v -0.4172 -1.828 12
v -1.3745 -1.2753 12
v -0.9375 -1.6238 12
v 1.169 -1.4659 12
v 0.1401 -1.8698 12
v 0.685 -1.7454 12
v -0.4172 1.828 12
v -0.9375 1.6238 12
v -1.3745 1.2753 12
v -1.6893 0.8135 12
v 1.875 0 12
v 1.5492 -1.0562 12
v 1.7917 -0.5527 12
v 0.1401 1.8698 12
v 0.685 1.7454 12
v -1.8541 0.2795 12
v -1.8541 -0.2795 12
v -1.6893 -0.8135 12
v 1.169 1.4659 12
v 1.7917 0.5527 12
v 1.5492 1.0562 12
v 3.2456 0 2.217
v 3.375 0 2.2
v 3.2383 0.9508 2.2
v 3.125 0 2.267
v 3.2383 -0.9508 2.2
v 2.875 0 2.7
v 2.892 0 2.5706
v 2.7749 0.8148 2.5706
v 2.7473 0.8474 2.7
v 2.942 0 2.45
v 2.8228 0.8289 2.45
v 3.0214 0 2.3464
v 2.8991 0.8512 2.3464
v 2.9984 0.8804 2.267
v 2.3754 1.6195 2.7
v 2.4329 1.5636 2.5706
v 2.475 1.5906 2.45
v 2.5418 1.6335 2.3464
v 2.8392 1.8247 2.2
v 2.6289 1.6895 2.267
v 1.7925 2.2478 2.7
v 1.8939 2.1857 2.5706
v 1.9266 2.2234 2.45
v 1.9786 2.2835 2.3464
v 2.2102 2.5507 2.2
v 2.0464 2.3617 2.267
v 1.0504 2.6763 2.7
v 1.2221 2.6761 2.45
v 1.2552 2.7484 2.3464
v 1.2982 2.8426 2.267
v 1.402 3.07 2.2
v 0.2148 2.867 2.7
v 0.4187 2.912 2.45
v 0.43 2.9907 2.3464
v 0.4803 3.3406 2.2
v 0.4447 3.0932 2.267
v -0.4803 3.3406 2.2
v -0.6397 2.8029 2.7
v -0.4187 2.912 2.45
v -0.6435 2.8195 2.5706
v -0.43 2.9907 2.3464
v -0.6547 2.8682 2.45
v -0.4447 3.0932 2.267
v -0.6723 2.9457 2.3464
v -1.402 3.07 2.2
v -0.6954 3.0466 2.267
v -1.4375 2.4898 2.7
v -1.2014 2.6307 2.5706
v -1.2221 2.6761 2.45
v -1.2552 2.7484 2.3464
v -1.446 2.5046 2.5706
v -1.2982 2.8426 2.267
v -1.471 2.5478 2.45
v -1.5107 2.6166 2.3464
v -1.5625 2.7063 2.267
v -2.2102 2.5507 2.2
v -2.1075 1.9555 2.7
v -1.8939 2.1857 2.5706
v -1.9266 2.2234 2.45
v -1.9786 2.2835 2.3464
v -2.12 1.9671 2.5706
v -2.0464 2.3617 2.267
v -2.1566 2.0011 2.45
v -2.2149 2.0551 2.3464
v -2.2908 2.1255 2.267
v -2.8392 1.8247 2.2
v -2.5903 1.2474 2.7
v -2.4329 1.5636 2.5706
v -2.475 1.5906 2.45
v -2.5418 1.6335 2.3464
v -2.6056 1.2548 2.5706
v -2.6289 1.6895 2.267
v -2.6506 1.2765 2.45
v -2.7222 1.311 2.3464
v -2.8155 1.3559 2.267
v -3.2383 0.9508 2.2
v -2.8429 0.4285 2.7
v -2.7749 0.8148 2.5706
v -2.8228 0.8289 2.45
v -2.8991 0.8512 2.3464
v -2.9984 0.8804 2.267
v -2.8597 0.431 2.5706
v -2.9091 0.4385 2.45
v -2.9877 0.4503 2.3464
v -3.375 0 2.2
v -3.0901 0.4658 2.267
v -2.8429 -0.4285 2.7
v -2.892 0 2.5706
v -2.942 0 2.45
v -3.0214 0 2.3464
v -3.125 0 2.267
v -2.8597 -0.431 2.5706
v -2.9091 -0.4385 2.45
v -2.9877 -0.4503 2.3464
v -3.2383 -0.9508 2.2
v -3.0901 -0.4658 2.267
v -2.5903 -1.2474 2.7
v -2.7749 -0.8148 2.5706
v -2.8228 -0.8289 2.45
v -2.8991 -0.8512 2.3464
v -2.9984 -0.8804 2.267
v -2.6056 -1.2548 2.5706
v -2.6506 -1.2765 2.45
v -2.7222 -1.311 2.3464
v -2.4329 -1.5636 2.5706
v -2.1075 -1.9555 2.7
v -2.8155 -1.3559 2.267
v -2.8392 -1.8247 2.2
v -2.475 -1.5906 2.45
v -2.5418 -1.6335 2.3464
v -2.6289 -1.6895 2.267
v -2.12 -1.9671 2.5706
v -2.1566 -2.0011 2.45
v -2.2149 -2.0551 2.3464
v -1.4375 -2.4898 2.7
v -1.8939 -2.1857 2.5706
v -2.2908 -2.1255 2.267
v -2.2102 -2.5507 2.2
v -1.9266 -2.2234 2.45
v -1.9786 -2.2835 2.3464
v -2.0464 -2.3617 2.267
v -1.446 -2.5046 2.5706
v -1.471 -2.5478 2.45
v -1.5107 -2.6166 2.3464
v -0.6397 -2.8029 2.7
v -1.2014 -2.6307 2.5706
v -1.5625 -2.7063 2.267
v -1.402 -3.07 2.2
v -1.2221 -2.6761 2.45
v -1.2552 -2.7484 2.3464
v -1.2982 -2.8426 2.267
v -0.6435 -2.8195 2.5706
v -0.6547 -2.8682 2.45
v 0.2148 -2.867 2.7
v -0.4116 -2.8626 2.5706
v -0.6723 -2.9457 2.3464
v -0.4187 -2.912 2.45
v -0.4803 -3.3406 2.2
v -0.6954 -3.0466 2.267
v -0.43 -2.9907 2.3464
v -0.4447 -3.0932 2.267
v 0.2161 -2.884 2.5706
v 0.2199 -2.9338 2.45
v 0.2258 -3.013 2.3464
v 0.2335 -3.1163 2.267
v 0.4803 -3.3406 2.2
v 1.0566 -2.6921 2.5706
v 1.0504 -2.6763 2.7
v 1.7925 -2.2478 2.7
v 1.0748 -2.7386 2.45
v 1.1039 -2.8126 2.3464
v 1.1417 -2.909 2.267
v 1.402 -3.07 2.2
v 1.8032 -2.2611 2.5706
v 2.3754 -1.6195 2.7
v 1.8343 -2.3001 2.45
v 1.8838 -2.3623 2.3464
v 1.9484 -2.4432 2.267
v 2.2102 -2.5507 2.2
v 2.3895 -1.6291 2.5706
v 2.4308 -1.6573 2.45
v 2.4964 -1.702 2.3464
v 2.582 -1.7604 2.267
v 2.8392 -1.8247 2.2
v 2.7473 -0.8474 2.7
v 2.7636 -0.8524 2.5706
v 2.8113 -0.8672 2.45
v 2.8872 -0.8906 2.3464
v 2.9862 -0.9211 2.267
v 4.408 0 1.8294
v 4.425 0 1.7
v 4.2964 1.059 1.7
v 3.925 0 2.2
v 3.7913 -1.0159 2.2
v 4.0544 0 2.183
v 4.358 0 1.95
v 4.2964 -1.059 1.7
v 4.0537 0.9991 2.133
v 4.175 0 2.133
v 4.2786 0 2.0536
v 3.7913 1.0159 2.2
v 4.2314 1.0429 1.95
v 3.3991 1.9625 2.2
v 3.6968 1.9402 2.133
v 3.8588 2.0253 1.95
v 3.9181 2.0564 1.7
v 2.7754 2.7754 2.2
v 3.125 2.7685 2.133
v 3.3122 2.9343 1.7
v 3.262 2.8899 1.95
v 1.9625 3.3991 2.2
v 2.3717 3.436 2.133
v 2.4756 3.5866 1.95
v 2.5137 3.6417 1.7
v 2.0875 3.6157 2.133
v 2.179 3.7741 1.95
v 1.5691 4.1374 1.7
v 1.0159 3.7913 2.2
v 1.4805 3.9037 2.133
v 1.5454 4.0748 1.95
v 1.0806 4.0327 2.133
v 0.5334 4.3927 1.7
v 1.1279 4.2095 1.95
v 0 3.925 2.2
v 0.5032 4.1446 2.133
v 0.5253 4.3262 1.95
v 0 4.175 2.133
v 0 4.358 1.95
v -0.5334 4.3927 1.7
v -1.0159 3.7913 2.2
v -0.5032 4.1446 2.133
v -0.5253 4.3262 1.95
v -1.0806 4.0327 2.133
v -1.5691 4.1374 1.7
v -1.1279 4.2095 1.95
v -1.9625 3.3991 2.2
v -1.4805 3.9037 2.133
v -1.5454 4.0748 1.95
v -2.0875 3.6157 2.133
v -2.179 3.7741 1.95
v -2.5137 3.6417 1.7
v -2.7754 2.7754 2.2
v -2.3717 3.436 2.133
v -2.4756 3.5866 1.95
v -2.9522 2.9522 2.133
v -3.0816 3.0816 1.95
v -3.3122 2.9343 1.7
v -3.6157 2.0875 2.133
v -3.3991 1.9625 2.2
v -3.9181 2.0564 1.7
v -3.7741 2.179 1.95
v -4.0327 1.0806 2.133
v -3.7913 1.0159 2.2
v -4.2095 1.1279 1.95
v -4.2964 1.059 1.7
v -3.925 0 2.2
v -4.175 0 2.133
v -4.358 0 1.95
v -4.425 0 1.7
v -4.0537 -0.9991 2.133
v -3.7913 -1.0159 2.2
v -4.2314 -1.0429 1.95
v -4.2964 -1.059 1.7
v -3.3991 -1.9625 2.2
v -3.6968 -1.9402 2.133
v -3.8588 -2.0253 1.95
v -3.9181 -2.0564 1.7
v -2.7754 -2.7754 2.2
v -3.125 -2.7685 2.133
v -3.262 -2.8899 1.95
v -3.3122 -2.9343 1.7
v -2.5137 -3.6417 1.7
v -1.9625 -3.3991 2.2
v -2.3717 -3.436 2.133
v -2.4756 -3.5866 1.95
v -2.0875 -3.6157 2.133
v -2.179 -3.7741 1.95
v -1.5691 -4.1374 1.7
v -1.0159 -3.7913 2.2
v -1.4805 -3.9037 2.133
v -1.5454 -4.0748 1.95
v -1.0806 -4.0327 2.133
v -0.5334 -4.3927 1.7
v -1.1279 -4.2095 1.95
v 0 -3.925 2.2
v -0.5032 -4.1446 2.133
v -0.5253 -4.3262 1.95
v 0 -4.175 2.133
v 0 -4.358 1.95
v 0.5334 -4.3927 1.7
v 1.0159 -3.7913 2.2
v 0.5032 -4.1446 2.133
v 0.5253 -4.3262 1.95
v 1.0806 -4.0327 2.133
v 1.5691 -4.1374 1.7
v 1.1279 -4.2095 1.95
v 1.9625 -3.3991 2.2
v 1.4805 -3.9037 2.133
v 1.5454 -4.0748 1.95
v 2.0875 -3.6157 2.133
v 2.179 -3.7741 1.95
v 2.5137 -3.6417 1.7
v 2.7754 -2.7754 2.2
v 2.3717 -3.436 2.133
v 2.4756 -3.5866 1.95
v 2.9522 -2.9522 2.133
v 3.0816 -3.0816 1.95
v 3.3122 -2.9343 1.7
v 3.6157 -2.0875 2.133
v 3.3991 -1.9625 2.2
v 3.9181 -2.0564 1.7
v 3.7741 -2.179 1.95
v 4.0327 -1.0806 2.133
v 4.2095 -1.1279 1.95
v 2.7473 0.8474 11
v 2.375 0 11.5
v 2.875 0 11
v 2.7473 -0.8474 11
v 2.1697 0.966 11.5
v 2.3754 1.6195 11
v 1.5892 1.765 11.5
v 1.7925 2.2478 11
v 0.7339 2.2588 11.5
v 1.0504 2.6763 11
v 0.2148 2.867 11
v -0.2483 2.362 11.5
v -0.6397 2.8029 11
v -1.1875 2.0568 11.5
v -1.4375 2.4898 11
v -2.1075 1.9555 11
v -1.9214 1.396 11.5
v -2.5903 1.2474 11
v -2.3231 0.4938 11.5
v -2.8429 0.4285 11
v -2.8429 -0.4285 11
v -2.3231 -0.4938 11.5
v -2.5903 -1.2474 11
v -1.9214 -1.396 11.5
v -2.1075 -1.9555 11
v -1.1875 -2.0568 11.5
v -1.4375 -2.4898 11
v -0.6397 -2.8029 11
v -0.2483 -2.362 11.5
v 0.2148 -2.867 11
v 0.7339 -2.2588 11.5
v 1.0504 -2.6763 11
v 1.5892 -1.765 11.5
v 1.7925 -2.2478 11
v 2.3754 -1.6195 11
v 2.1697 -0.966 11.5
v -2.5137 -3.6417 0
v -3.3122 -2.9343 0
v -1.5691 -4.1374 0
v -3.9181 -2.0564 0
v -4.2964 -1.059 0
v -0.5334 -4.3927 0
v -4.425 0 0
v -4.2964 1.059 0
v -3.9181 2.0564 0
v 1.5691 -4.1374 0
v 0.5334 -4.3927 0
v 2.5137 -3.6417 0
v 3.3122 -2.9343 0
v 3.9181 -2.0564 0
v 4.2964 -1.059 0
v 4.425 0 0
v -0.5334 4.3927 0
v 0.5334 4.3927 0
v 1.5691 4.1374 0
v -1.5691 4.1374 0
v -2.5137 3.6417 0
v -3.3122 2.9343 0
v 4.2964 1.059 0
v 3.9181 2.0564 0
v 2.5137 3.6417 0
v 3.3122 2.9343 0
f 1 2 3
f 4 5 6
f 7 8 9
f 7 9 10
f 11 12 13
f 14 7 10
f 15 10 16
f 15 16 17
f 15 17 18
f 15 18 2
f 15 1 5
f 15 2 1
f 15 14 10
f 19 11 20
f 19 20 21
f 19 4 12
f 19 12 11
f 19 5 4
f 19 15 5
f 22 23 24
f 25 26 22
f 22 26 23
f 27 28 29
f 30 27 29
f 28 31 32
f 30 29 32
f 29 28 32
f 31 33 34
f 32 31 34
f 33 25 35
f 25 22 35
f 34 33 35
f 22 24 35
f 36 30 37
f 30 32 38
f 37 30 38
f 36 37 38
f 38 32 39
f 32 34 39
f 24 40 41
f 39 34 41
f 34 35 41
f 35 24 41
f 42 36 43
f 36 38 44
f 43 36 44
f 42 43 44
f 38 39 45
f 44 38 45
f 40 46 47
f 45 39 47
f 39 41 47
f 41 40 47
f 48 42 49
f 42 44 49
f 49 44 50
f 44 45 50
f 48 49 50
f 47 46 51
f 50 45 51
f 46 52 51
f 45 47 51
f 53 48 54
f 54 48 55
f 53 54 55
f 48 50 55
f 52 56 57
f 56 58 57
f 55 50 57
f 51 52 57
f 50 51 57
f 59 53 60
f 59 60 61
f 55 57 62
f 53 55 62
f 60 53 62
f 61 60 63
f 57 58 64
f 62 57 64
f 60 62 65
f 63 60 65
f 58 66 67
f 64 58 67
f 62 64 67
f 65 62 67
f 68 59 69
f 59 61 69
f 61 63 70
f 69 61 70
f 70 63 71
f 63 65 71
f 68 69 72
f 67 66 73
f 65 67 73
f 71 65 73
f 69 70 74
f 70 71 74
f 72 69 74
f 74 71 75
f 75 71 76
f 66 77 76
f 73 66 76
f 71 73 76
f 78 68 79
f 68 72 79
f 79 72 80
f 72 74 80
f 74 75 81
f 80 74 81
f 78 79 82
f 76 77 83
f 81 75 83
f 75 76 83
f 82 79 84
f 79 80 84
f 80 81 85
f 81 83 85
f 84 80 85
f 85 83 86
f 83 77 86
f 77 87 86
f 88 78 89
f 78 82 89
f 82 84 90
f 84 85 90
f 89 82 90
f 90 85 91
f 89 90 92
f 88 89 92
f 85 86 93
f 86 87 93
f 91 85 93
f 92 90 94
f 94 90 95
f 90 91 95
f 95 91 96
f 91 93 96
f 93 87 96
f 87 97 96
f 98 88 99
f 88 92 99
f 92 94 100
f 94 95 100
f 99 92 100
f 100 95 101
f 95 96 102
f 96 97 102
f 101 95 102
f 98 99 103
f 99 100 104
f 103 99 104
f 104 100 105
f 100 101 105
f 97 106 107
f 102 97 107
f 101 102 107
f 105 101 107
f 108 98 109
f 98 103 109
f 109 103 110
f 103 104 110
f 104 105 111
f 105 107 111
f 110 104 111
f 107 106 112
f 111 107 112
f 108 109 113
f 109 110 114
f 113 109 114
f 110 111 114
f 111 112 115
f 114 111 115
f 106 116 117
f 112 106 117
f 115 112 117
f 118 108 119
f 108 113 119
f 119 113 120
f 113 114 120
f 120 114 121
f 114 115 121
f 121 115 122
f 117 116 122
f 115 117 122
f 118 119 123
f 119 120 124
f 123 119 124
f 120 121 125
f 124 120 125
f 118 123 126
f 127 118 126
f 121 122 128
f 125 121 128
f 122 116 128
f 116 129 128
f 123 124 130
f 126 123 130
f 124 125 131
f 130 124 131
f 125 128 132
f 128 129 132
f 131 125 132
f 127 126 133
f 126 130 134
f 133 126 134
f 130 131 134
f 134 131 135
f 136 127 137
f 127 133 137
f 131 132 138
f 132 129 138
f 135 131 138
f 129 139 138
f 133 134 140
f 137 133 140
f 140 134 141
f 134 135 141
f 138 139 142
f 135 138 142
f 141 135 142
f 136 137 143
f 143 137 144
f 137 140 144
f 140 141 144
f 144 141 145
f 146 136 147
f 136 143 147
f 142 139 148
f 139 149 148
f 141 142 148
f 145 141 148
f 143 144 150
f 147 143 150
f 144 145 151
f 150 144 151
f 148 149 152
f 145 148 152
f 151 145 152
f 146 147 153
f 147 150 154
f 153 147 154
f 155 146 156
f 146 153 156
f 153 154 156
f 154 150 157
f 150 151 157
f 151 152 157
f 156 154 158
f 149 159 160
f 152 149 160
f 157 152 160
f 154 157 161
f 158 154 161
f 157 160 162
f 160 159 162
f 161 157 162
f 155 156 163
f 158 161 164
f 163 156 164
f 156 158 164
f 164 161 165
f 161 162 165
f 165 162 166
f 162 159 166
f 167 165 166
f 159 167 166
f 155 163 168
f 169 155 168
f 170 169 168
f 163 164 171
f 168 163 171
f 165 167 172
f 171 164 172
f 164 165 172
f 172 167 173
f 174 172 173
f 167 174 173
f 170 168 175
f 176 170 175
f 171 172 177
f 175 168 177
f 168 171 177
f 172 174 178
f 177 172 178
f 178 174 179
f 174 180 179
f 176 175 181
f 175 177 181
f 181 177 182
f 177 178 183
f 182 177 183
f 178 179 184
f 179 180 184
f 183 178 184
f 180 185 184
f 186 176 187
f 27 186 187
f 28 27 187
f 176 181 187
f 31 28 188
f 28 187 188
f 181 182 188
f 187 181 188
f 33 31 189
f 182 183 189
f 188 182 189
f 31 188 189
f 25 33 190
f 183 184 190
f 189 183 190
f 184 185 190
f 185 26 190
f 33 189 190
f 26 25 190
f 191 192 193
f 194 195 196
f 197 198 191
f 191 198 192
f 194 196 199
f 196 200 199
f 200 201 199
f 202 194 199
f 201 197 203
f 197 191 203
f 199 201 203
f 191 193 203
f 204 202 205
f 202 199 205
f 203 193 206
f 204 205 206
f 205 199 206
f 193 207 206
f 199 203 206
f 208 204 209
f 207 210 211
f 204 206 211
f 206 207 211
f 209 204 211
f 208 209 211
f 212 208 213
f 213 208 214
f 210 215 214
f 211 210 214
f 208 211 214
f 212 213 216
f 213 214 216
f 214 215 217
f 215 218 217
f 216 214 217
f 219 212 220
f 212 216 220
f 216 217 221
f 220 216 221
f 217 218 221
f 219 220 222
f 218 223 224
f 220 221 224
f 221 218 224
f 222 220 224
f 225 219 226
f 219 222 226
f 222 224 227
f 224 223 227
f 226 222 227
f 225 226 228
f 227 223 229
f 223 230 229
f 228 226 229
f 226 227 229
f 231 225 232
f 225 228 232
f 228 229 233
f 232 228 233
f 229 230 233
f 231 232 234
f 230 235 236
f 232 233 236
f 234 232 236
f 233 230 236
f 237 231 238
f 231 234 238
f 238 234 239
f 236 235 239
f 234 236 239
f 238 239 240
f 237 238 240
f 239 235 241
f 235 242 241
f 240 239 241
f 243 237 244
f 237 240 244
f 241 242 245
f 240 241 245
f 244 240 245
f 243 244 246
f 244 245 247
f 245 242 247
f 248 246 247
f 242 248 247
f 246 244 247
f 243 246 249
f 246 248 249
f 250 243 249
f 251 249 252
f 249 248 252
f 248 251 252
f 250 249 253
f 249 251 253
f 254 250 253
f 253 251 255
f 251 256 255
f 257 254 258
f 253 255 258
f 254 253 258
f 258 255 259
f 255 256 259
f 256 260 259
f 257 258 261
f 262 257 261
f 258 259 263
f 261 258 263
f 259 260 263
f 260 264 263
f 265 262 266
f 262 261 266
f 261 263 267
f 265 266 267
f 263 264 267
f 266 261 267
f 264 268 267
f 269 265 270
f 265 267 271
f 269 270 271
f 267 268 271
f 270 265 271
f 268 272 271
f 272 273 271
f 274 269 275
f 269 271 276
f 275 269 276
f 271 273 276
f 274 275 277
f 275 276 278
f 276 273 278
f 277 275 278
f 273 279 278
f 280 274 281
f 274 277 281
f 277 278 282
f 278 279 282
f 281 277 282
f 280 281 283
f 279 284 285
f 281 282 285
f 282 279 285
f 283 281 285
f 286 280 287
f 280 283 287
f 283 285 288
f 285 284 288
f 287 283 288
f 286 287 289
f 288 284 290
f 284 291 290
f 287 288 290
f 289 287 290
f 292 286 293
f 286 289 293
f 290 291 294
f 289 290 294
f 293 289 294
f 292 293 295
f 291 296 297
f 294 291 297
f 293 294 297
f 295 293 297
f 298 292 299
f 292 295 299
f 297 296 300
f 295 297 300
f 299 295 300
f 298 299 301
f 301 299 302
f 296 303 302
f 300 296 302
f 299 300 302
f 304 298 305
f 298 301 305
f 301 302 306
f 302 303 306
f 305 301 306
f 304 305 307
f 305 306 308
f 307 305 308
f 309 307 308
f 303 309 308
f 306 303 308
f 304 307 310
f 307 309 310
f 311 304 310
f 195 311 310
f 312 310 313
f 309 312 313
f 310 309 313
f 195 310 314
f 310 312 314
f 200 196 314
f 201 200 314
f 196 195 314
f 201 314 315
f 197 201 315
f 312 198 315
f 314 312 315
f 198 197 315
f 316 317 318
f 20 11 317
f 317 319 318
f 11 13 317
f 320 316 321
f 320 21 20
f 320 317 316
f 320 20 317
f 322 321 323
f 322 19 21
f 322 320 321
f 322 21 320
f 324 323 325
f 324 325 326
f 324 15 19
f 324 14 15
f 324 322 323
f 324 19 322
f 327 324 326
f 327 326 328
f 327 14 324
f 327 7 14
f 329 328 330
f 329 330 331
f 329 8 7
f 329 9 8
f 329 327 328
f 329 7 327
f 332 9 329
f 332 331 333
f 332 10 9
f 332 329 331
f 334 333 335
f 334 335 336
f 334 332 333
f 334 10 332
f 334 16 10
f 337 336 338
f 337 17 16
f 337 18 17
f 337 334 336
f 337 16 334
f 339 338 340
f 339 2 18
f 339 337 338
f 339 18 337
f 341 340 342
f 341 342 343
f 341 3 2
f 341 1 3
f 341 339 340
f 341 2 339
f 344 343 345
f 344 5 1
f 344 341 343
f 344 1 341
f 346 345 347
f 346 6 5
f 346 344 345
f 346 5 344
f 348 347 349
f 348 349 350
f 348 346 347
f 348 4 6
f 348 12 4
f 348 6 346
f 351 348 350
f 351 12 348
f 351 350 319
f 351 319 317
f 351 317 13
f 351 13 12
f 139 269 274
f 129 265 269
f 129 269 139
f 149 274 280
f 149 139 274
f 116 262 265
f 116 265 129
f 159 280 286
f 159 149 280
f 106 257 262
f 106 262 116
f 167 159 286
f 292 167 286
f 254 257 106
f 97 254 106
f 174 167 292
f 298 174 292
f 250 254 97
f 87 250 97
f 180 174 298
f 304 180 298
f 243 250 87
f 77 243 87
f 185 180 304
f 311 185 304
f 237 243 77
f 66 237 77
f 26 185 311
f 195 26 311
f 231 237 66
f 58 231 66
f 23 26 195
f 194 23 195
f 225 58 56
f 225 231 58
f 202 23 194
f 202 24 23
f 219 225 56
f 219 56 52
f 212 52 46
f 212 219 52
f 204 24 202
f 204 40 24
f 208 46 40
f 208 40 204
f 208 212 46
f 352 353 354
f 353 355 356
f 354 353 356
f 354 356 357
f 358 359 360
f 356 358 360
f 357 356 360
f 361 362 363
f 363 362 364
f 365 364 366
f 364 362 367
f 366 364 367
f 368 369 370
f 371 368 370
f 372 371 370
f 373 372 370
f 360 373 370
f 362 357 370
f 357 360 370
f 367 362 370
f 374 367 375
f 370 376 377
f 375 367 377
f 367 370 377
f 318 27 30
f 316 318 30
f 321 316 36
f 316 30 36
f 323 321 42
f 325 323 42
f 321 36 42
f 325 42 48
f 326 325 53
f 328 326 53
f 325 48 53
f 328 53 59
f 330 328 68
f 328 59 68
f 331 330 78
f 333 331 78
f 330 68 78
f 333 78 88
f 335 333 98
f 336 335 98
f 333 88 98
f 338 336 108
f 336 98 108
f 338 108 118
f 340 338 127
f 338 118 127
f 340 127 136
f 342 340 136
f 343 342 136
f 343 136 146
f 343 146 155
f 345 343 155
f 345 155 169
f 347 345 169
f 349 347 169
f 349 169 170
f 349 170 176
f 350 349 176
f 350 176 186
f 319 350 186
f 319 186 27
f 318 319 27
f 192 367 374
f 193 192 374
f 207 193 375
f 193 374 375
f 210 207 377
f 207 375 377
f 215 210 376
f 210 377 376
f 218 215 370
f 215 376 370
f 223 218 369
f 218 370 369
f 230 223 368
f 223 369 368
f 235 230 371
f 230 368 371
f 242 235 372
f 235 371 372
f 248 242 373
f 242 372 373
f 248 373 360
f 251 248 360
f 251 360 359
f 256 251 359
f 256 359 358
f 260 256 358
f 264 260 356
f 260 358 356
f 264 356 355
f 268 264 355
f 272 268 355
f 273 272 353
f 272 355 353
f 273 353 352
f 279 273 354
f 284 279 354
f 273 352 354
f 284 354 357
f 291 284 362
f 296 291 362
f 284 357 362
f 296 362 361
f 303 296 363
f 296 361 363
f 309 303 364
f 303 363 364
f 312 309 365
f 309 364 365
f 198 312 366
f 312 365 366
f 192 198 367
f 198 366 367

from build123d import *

# Parameters (mm, degrees)
F0_R     = 2.875
F1_DEPTH = 12
F0_R_2   = 4.425
F2_DEPTH = 2.2
F3_SIZE  = 1
F4_R     = 0.5


with BuildPart() as f1:
    # F0 (on Top) → F1 (new body)
    with BuildSketch(Plane.XY):
        Circle(F0_R)
    extrude(amount=F1_DEPTH)

    # F0 (on Top) → F2 (join)
    with BuildSketch(Plane.XY):
        Circle(F0_R_2)
        Circle(F0_R, mode=Mode.SUBTRACT)
    extrude(amount=F2_DEPTH)

    # F3
    f3_edges = [f1.edges().sort_by_distance(p)[0] for p in [
        (-2.875, 0, 12),
    ]]
    chamfer(f3_edges, length=F3_SIZE)

    # F4
    f4_edges = [f1.edges().sort_by_distance(p)[0] for p in [
        (-4.425, 0, 2.2),
        (-2.875, 0, 2.2),
    ]]
    fillet(f4_edges, radius=F4_R)


solid = f1.part
